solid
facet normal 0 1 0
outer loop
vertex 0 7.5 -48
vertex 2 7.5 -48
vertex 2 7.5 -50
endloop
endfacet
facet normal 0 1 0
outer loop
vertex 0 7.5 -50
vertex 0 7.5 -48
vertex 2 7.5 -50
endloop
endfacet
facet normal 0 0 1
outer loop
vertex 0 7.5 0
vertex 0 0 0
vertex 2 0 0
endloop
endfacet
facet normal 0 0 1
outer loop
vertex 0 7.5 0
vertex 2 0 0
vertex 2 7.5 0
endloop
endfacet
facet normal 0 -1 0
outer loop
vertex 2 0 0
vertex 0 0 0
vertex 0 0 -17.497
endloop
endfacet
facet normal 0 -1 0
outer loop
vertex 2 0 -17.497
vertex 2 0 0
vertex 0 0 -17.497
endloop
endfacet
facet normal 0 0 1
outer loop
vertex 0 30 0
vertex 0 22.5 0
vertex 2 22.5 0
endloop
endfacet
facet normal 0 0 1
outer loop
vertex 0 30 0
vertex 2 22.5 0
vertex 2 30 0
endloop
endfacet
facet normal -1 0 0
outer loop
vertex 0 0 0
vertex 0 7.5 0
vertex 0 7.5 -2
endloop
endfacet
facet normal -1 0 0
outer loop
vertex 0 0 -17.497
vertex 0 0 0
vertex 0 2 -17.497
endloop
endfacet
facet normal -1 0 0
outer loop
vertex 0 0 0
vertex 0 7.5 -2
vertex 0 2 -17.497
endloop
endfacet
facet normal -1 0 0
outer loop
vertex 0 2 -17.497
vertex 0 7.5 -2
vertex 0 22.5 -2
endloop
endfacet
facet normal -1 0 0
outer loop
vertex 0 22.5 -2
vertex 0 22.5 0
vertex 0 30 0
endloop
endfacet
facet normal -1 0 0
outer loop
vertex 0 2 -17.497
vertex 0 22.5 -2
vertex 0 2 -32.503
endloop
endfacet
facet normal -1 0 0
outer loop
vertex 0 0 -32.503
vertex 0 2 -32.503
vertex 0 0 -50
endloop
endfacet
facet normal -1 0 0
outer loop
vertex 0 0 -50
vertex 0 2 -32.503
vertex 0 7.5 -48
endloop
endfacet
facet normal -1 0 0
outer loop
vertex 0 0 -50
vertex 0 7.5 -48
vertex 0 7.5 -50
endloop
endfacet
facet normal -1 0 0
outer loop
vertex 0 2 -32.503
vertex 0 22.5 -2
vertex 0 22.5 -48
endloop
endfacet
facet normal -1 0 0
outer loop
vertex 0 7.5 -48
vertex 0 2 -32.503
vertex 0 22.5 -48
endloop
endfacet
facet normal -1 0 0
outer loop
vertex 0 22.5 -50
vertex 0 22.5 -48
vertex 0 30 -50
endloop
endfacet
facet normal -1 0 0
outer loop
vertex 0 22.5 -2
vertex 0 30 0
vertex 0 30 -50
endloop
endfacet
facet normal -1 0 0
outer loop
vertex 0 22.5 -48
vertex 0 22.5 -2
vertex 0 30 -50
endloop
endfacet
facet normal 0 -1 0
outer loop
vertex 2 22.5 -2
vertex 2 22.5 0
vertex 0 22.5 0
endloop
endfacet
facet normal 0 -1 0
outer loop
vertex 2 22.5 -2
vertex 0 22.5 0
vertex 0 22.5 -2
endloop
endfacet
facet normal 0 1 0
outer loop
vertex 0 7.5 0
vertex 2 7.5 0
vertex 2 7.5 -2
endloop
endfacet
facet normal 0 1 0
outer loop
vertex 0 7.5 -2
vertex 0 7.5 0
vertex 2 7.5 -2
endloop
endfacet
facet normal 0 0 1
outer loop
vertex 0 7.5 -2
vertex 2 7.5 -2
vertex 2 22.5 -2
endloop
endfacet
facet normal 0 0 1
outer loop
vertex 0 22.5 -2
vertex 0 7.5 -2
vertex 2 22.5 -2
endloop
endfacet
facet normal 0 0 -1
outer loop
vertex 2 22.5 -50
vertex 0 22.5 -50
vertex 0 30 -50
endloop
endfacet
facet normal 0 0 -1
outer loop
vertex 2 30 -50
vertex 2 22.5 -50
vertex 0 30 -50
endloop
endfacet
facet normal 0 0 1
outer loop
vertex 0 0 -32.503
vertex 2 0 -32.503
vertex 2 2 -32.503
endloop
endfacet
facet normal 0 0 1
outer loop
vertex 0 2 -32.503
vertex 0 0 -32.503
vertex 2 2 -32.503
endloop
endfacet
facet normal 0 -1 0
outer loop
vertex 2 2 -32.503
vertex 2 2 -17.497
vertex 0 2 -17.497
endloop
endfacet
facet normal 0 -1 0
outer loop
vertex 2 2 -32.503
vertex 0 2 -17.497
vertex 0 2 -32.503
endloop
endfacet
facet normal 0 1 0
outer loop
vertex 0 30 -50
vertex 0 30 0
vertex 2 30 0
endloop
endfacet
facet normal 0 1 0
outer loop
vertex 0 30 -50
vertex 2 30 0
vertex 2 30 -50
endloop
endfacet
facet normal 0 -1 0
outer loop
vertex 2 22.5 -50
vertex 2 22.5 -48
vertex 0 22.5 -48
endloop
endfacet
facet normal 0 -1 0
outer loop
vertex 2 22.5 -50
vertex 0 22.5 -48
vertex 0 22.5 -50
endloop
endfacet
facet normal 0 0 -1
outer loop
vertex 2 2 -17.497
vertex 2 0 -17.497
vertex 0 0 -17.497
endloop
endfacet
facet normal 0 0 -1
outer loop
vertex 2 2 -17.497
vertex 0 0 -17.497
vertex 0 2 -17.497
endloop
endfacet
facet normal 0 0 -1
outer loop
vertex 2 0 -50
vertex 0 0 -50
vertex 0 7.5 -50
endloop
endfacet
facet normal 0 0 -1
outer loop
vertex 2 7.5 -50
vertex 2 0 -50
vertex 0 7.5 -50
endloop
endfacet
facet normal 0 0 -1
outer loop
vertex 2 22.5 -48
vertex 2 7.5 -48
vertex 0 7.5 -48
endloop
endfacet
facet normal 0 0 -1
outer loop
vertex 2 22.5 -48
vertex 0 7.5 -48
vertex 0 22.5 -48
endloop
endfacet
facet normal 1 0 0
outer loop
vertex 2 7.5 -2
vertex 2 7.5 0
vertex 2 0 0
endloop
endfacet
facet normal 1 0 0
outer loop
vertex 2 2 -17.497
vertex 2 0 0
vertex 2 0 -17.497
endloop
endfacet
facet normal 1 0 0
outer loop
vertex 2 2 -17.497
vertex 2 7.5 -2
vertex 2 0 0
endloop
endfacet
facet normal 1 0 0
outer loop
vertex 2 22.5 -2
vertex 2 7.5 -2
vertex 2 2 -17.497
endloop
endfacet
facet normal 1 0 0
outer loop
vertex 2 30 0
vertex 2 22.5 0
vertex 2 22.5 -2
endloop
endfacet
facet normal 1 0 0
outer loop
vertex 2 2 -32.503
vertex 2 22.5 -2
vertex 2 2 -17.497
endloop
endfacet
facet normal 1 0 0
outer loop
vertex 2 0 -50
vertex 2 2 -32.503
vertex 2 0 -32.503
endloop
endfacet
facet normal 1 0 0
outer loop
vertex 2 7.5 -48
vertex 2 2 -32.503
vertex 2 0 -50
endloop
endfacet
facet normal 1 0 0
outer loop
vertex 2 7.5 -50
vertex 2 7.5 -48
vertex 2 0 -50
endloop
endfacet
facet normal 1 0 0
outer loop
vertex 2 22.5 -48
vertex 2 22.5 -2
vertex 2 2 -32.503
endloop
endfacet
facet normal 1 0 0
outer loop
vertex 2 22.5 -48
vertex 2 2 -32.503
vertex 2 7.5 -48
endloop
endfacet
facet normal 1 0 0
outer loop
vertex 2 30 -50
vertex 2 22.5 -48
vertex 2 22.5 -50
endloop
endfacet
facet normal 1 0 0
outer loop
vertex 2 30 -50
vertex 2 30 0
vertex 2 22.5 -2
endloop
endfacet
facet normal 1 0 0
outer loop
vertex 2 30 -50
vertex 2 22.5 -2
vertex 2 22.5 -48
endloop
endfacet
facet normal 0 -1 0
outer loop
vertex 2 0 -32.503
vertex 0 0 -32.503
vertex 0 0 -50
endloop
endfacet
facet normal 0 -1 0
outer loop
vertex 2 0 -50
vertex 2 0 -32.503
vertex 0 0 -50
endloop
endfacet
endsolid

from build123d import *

# Parameters (mm, degrees)
ESQUISSE1_W             = 50
ESQUISSE1_H             = 30
BOSS_EXTRU_1_DEPTH      = 2
ESQUISSE2_W             = 2
ESQUISSE2_H             = 15
ENL_V_MAT_EXTRU_1_DEPTH = 2
ESQUISSE3_W             = 15.005230118
ESQUISSE3_H             = 2
ENL_V_MAT_EXTRU_2_DEPTH = 2


with BuildPart() as part:
    # Esquisse1 → Boss.-Extru.1 (new body)
    with BuildSketch(Plane(origin=(0, 0, 0), x_dir=(0, 0, -1), z_dir=(1, 0, 0))):
        with Locations((25, 15)):
            Rectangle(ESQUISSE1_W, ESQUISSE1_H)
    extrude(amount=BOSS_EXTRU_1_DEPTH)

    # Esquisse2 → Enlèv. mat.-Extru.1 (cut)
    with BuildSketch(Plane(origin=(2, 0, 0), x_dir=(0, 0, -1), z_dir=(1, 0, 0))):
        with Locations((1, 15)):
            Rectangle(ESQUISSE2_W, ESQUISSE2_H)
        with Locations((49, 15)):
            Rectangle(ESQUISSE2_W, ESQUISSE2_H)
    extrude(amount=-ENL_V_MAT_EXTRU_1_DEPTH, mode=Mode.SUBTRACT)

    # Esquisse3 → Enlèv. mat.-Extru.2 (cut)
    with BuildSketch(Plane(origin=(2, 0, 0), x_dir=(0, 0, -1), z_dir=(1, 0, 0))):
        with Locations((25, 1)):
            Rectangle(ESQUISSE3_W, ESQUISSE3_H)
    extrude(amount=-ENL_V_MAT_EXTRU_2_DEPTH, mode=Mode.SUBTRACT)


solid = part.part
